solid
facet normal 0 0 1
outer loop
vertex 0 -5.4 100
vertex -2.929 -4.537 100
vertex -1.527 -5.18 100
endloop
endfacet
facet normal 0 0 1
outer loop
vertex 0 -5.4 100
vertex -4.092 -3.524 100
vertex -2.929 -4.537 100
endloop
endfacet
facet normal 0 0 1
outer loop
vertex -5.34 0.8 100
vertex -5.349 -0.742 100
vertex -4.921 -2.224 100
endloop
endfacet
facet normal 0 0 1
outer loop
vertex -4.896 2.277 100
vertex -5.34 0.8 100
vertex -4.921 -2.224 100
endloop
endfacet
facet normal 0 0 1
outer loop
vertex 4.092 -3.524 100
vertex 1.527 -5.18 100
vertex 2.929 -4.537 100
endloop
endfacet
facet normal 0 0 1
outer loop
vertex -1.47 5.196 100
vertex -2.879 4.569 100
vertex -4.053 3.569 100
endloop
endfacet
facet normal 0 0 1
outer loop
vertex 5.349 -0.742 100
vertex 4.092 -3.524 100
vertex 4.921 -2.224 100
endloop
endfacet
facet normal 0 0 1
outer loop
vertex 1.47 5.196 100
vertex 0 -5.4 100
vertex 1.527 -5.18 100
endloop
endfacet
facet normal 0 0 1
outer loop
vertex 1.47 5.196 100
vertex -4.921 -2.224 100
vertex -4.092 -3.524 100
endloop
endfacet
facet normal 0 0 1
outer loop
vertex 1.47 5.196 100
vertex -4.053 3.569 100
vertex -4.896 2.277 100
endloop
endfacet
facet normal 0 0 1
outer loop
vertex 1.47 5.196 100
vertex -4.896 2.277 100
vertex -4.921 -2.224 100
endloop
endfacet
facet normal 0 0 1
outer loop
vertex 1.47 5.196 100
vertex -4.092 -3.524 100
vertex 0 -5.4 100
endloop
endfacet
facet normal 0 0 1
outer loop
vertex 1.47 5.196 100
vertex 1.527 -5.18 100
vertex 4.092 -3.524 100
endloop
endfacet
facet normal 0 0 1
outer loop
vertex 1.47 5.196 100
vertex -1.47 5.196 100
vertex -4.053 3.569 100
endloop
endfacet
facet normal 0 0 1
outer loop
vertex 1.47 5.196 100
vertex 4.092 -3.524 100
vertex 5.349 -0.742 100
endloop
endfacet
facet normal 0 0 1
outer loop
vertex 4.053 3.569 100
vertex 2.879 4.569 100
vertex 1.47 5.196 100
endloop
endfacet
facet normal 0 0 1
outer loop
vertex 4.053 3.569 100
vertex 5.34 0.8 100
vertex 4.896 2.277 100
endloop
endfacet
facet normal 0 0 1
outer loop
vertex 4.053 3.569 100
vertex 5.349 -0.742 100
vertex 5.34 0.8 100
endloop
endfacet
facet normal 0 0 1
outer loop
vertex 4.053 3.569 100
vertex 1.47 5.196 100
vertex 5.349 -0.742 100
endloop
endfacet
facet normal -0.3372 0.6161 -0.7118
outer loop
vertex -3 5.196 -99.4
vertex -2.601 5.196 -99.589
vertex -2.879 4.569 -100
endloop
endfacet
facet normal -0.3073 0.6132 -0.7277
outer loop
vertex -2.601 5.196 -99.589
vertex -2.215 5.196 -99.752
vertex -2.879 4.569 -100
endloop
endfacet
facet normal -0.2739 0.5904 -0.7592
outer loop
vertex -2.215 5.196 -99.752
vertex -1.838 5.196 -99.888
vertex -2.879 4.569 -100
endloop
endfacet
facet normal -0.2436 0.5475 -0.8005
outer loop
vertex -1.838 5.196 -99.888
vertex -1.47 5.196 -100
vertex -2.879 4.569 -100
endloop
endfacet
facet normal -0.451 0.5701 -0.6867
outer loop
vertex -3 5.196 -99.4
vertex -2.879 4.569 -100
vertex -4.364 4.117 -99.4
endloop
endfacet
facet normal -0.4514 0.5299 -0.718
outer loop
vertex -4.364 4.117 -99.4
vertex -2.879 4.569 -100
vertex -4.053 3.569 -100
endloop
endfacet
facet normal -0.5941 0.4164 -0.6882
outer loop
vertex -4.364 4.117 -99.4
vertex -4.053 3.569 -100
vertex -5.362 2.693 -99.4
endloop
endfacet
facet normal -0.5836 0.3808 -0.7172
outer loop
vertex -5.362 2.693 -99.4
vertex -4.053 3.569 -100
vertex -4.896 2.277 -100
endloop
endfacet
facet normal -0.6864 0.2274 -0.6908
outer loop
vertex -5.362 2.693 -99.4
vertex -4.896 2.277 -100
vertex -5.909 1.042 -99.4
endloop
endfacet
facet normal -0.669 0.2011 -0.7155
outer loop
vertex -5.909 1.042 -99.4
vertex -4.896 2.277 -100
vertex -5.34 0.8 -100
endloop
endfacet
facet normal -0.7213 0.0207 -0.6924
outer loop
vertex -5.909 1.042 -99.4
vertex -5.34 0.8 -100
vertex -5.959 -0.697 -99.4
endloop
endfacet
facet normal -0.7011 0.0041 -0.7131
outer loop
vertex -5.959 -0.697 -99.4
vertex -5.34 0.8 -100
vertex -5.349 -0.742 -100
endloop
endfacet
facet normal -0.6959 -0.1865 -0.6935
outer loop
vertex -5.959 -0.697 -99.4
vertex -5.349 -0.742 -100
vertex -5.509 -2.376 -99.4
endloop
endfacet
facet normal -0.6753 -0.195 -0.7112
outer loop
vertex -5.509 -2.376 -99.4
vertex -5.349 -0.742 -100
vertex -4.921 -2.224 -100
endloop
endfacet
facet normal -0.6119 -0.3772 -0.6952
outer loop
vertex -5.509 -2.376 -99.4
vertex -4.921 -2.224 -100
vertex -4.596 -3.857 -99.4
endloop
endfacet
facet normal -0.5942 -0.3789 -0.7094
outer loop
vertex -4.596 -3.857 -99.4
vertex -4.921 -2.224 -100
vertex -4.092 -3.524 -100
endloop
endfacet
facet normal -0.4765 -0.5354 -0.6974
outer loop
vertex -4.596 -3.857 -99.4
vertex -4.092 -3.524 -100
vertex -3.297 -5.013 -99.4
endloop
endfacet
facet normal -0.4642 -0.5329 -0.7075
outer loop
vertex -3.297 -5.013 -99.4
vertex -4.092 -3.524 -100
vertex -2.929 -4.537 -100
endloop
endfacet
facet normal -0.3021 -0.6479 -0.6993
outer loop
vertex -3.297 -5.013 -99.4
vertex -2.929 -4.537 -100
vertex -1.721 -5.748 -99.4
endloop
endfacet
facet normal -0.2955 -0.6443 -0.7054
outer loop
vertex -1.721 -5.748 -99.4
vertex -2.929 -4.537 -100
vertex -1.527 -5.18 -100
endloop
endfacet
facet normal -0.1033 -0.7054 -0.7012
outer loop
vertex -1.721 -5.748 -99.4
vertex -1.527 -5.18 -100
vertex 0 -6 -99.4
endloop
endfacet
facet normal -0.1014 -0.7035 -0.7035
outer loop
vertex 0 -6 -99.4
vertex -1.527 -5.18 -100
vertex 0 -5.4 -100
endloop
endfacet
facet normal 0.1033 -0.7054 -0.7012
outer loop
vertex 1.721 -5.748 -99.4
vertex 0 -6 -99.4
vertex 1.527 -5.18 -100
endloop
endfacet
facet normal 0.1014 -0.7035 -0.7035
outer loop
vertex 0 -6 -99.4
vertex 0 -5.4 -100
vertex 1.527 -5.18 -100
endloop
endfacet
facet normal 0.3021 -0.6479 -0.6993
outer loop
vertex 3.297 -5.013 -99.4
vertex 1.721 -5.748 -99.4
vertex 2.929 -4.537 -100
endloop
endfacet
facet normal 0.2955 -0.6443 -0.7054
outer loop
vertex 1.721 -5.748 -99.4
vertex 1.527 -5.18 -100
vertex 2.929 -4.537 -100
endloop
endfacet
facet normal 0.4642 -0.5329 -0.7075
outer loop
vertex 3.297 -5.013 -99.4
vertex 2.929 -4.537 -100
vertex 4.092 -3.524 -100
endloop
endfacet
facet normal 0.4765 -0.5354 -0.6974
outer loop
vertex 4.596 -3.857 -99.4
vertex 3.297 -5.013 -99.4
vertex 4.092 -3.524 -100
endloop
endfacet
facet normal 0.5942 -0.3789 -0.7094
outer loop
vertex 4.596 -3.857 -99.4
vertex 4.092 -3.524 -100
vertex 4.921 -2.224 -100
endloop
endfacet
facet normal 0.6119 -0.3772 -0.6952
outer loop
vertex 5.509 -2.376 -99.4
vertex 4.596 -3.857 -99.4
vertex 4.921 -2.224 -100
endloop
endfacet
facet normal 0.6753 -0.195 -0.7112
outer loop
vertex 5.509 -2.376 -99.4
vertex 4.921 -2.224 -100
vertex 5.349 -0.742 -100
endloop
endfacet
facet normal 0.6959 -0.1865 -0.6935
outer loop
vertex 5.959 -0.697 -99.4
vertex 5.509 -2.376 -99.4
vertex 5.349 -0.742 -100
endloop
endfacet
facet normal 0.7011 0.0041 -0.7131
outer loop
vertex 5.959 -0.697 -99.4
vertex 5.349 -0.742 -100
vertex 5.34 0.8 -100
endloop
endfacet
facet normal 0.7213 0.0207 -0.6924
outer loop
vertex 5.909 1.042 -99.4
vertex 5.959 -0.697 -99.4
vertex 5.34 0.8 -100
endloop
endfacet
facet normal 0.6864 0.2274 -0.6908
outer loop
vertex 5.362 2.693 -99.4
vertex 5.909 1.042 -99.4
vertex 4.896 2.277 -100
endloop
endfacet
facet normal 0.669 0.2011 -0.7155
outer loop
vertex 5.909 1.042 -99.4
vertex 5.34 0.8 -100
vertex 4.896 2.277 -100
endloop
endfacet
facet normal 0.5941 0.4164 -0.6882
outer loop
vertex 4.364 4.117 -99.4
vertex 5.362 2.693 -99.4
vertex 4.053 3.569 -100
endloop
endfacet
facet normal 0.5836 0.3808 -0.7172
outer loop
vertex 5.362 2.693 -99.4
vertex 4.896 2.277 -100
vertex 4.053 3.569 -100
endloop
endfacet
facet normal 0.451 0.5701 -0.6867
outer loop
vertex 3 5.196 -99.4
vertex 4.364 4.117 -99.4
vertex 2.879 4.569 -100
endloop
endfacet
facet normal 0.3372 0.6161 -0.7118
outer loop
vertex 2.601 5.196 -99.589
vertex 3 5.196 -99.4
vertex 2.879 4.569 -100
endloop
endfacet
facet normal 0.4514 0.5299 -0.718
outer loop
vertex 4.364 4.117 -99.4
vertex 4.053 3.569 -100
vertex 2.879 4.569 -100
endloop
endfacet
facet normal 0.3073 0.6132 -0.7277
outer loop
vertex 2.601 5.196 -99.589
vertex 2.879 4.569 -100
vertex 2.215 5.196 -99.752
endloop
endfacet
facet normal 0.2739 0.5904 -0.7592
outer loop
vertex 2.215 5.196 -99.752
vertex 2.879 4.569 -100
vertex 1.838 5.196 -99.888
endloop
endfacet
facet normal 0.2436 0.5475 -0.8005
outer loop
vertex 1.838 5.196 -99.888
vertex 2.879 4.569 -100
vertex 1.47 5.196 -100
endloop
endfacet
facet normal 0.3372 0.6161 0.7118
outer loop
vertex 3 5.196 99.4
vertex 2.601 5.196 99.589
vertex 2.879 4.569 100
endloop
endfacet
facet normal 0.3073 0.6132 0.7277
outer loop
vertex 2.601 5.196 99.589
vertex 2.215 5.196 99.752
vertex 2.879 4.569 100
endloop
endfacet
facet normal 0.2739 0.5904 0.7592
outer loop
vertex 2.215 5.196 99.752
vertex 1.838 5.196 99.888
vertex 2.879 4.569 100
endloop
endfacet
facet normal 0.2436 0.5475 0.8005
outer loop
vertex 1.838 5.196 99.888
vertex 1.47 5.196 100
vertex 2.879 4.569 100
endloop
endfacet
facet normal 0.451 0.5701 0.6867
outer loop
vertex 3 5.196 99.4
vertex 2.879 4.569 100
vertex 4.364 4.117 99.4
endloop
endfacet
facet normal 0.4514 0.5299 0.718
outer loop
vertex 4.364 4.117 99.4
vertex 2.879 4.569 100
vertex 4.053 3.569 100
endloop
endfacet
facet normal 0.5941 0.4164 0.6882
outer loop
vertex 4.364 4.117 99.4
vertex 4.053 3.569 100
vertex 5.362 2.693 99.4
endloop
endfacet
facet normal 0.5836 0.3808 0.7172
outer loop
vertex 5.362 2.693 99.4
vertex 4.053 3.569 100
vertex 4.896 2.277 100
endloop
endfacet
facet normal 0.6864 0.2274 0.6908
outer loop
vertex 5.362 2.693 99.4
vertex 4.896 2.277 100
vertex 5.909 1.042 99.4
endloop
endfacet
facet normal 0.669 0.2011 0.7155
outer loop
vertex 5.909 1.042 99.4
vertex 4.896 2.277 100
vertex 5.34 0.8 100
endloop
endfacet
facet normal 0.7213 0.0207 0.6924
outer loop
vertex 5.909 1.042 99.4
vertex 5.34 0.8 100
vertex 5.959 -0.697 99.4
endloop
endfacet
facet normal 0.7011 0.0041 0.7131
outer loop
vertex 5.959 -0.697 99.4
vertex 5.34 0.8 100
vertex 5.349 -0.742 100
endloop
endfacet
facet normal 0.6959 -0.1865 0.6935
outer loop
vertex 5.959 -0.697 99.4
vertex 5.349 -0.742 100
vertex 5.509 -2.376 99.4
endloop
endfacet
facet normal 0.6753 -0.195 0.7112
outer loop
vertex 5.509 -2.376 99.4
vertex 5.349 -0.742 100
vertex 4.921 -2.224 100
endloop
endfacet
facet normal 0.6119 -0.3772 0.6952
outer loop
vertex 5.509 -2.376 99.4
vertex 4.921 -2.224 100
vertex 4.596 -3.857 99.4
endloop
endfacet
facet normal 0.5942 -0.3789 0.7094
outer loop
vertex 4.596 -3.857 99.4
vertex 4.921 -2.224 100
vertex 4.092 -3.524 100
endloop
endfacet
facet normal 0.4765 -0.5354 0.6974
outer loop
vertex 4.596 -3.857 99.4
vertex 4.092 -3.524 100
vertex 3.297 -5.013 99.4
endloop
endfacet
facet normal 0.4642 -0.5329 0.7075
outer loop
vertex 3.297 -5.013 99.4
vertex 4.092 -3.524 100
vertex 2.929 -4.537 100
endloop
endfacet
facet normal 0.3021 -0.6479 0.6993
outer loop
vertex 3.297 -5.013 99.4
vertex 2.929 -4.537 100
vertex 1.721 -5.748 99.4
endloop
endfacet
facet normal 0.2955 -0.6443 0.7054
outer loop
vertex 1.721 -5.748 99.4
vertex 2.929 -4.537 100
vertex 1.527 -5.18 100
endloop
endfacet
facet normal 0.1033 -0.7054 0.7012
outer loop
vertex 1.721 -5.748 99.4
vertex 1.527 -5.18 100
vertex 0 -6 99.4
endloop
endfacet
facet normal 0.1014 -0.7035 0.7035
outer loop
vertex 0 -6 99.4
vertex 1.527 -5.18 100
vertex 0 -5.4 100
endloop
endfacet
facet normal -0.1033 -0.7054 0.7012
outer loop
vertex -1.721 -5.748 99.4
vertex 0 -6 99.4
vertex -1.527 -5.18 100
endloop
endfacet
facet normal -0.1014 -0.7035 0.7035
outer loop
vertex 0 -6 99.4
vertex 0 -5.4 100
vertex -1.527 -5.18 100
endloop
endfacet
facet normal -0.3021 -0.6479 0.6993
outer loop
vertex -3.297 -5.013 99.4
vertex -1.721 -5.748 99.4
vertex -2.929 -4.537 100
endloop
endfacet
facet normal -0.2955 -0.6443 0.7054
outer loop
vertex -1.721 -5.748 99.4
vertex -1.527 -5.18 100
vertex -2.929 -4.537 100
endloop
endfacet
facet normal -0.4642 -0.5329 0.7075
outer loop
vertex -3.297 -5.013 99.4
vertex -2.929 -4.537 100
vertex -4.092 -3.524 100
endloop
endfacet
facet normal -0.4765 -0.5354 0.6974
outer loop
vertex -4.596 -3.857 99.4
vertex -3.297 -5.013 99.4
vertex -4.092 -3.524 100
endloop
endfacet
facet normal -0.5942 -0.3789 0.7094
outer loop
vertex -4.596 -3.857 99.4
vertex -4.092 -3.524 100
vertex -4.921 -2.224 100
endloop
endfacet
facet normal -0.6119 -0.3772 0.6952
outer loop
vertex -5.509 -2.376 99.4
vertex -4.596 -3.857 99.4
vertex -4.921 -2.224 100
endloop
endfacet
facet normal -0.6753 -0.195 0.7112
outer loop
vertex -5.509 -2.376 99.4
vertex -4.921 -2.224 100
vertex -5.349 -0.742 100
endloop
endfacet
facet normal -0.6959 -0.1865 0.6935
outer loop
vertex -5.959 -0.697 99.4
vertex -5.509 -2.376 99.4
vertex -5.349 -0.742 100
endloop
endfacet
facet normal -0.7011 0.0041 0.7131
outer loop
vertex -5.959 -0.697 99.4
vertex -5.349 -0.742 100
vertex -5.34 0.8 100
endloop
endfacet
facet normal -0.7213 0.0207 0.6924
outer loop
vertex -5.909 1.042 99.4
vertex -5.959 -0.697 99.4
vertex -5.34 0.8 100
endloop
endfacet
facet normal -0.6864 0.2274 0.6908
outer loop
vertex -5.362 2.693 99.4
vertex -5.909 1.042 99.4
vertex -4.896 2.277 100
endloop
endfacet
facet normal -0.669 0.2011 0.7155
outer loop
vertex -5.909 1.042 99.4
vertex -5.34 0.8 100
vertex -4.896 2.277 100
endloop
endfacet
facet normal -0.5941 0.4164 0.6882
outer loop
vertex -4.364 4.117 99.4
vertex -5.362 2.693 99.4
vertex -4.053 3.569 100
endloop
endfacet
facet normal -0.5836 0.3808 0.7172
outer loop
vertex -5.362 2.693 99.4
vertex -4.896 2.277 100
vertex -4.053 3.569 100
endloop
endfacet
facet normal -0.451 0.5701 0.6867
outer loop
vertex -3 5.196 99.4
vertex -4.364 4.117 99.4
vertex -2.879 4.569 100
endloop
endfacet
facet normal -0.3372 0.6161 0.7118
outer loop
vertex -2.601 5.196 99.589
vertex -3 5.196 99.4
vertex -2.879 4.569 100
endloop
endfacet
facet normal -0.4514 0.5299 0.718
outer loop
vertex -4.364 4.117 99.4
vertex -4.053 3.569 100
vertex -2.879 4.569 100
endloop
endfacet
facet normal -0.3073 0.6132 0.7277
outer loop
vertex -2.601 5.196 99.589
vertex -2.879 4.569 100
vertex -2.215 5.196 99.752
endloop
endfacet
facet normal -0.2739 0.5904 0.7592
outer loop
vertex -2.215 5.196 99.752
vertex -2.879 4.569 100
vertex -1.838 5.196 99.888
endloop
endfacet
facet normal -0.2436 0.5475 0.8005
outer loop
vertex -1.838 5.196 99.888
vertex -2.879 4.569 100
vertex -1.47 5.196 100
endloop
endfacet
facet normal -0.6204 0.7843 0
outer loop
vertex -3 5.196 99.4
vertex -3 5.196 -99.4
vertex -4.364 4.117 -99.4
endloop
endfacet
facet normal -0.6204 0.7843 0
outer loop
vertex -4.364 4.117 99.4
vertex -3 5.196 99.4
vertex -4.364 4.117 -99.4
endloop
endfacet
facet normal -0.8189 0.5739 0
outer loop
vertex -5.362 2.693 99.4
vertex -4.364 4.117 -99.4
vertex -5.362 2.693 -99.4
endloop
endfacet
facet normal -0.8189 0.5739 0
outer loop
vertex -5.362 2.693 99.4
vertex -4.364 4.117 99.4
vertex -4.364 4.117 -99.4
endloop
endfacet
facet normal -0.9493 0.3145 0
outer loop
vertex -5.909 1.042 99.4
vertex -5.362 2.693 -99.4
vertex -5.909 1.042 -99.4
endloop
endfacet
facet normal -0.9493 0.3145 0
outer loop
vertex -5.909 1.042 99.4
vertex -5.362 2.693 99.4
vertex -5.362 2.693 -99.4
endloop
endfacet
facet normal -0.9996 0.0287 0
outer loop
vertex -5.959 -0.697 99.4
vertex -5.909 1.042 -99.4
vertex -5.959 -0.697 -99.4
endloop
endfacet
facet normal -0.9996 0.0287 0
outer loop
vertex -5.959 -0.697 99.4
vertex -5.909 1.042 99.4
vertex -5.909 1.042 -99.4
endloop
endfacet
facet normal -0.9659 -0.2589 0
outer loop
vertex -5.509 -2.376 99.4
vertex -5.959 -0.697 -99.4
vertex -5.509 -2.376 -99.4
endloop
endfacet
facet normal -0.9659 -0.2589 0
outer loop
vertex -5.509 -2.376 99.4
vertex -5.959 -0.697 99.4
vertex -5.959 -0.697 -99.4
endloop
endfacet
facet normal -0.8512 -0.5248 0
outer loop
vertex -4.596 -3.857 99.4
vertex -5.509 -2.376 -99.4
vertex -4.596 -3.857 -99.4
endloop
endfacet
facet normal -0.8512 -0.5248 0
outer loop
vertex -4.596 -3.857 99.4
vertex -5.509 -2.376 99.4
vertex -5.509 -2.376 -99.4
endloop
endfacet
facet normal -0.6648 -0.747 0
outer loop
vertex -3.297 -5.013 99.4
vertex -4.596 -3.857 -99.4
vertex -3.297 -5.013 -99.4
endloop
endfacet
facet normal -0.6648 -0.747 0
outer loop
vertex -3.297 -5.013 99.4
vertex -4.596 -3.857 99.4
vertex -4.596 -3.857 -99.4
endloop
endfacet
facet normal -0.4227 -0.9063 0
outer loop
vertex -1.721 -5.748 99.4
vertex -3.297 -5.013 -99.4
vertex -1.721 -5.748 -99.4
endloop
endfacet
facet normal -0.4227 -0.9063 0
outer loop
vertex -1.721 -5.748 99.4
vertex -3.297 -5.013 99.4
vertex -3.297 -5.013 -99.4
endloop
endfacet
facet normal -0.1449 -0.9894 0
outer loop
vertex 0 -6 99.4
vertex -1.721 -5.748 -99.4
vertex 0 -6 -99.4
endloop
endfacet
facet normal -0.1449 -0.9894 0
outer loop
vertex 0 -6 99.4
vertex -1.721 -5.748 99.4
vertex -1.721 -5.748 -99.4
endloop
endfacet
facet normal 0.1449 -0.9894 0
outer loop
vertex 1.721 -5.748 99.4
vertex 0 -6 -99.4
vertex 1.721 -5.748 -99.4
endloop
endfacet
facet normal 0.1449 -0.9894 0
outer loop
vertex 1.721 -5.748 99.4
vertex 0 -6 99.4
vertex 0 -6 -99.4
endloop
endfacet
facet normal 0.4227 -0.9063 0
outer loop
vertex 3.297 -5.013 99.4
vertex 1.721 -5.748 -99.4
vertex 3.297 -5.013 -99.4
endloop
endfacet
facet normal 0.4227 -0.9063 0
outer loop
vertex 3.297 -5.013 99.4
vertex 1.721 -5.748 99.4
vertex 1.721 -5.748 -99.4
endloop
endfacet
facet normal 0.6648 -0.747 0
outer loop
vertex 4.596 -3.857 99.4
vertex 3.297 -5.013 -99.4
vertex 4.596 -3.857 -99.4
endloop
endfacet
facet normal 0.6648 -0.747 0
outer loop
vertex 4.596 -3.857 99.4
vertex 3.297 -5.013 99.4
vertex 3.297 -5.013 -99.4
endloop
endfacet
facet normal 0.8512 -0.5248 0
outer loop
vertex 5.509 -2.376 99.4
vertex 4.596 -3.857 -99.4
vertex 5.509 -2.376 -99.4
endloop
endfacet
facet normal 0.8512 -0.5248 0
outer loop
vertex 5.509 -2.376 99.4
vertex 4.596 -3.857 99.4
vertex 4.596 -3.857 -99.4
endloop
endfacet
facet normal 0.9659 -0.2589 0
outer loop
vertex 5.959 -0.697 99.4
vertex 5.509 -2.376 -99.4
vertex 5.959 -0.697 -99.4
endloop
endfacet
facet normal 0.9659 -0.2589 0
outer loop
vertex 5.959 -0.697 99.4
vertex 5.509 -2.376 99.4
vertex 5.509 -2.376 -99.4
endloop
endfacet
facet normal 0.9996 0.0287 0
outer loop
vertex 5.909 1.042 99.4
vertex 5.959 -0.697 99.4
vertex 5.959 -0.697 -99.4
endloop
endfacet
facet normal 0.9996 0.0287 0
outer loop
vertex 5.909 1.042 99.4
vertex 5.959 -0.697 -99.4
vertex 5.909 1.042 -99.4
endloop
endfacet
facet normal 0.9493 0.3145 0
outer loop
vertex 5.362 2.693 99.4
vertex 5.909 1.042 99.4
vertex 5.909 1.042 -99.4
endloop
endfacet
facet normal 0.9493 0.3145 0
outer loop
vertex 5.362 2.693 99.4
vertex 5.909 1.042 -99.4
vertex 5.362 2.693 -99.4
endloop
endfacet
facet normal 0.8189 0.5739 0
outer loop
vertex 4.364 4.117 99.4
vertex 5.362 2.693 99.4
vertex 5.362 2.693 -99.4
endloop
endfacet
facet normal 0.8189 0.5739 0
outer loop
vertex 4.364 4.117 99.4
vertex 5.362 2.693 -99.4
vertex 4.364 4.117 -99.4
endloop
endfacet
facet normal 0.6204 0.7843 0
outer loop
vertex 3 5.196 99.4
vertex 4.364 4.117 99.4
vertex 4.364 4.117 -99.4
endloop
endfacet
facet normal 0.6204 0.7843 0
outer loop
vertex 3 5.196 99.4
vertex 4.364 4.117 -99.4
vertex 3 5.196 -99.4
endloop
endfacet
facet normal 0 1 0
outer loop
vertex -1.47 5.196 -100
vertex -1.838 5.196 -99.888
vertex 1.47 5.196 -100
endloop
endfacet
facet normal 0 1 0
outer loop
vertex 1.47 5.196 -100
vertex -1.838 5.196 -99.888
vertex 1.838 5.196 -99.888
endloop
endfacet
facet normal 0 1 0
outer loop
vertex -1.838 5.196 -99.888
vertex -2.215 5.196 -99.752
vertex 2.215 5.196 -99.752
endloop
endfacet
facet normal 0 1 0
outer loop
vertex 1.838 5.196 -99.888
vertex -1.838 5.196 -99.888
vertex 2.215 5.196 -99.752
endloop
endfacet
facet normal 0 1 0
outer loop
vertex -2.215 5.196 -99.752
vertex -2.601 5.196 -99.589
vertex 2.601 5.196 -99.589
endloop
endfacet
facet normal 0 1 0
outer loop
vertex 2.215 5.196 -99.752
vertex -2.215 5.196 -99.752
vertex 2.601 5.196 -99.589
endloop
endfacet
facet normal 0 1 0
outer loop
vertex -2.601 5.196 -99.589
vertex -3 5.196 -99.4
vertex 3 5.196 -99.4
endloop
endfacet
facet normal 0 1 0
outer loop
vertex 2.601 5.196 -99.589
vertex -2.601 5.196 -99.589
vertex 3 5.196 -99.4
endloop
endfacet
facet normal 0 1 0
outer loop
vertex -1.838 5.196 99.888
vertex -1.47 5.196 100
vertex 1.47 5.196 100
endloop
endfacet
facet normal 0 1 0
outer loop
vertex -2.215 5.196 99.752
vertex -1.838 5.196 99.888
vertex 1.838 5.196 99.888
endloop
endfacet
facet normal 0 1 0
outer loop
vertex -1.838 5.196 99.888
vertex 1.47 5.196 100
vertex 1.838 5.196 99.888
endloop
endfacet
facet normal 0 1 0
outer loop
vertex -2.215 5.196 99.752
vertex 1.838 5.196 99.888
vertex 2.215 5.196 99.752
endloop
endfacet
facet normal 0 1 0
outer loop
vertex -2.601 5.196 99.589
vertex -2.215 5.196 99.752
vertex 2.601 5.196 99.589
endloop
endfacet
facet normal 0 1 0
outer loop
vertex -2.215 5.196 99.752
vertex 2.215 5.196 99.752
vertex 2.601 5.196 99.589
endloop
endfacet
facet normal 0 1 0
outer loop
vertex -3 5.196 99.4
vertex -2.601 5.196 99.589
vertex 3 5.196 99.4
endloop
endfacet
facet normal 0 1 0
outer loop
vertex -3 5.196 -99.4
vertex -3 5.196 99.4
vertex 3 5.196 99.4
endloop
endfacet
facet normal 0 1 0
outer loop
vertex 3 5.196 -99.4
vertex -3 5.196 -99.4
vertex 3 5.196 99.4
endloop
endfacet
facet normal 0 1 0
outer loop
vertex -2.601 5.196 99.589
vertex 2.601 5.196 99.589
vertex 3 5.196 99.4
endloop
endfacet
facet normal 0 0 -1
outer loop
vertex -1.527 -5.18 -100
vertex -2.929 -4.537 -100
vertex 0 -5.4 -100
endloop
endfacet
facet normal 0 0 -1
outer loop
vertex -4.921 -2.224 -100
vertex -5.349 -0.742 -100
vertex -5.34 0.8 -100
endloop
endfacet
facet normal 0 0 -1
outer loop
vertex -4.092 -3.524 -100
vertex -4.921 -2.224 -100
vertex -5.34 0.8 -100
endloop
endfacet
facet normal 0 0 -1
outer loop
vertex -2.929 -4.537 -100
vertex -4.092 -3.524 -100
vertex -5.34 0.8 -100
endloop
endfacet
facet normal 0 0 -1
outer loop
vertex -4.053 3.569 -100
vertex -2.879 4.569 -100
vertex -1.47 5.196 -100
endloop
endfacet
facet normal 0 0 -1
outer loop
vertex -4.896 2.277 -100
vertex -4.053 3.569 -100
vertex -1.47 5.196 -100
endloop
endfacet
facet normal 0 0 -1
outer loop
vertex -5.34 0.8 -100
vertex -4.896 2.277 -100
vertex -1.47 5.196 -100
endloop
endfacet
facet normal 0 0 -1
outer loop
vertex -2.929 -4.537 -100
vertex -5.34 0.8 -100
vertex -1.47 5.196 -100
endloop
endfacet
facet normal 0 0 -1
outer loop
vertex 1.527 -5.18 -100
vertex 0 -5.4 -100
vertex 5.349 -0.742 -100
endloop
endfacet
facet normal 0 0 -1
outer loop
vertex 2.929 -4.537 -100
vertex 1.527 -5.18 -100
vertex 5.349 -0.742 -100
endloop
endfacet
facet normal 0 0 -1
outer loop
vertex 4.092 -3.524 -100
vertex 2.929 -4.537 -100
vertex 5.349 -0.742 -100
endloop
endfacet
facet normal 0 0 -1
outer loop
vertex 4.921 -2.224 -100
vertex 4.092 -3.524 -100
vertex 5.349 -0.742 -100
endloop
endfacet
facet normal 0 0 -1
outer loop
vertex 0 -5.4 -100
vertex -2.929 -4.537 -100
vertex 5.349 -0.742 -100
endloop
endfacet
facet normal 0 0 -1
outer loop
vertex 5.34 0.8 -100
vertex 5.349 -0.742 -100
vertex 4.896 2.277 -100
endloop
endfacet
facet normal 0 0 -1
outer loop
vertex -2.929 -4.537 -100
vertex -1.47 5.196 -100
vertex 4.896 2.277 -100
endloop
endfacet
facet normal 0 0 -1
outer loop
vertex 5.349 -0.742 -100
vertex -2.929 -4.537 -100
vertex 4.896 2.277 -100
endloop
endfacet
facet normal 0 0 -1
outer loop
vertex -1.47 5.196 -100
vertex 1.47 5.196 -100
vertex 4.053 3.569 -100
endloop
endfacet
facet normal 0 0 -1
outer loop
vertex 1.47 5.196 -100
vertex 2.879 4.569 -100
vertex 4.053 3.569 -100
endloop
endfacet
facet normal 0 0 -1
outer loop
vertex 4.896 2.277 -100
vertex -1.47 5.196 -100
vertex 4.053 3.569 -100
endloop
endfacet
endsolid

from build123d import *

# Parameters (mm, degrees)
SKETCH3_R                = 6
BOSS_EXTRUDE2_DEPTH      = 100
BOSS_EXTRUDE2_DEPTH_BACK = 100
CUT_EXTRUDE5_DEPTH       = 101
CUT_EXTRUDE5_DEPTH_BACK  = 101
CHAMFER1_SIZE            = 0.6


with BuildPart() as part:
    # Sketch3 → Boss-Extrude2 (new body, two sides)
    with BuildSketch(Plane.XY) as boss_extrude2_sk:
        Circle(SKETCH3_R)
    extrude(amount=BOSS_EXTRUDE2_DEPTH)
    extrude(boss_extrude2_sk.sketch, amount=-BOSS_EXTRUDE2_DEPTH_BACK)

    # Sketch10 → Cut-Extrude5 (cut, two sides)
    with BuildSketch(Plane.XY) as cut_extrude5_sk:
        with BuildLine():
            Line((-3, 5.196152423), (3, 5.196152423))
            ThreePointArc((3, 5.196152423), (0, 6), (-3, 5.196152423))
        make_face()
    extrude(amount=CUT_EXTRUDE5_DEPTH, mode=Mode.SUBTRACT)
    extrude(cut_extrude5_sk.sketch, amount=-CUT_EXTRUDE5_DEPTH_BACK, mode=Mode.SUBTRACT)

    # Chamfer1
    chamfer1_edges = [part.edges().sort_by_distance(p)[0] for p in [
        (0, -6, -100),
        (0, -6, 100),
    ]]
    chamfer(chamfer1_edges, length=CHAMFER1_SIZE)


solid = part.part
